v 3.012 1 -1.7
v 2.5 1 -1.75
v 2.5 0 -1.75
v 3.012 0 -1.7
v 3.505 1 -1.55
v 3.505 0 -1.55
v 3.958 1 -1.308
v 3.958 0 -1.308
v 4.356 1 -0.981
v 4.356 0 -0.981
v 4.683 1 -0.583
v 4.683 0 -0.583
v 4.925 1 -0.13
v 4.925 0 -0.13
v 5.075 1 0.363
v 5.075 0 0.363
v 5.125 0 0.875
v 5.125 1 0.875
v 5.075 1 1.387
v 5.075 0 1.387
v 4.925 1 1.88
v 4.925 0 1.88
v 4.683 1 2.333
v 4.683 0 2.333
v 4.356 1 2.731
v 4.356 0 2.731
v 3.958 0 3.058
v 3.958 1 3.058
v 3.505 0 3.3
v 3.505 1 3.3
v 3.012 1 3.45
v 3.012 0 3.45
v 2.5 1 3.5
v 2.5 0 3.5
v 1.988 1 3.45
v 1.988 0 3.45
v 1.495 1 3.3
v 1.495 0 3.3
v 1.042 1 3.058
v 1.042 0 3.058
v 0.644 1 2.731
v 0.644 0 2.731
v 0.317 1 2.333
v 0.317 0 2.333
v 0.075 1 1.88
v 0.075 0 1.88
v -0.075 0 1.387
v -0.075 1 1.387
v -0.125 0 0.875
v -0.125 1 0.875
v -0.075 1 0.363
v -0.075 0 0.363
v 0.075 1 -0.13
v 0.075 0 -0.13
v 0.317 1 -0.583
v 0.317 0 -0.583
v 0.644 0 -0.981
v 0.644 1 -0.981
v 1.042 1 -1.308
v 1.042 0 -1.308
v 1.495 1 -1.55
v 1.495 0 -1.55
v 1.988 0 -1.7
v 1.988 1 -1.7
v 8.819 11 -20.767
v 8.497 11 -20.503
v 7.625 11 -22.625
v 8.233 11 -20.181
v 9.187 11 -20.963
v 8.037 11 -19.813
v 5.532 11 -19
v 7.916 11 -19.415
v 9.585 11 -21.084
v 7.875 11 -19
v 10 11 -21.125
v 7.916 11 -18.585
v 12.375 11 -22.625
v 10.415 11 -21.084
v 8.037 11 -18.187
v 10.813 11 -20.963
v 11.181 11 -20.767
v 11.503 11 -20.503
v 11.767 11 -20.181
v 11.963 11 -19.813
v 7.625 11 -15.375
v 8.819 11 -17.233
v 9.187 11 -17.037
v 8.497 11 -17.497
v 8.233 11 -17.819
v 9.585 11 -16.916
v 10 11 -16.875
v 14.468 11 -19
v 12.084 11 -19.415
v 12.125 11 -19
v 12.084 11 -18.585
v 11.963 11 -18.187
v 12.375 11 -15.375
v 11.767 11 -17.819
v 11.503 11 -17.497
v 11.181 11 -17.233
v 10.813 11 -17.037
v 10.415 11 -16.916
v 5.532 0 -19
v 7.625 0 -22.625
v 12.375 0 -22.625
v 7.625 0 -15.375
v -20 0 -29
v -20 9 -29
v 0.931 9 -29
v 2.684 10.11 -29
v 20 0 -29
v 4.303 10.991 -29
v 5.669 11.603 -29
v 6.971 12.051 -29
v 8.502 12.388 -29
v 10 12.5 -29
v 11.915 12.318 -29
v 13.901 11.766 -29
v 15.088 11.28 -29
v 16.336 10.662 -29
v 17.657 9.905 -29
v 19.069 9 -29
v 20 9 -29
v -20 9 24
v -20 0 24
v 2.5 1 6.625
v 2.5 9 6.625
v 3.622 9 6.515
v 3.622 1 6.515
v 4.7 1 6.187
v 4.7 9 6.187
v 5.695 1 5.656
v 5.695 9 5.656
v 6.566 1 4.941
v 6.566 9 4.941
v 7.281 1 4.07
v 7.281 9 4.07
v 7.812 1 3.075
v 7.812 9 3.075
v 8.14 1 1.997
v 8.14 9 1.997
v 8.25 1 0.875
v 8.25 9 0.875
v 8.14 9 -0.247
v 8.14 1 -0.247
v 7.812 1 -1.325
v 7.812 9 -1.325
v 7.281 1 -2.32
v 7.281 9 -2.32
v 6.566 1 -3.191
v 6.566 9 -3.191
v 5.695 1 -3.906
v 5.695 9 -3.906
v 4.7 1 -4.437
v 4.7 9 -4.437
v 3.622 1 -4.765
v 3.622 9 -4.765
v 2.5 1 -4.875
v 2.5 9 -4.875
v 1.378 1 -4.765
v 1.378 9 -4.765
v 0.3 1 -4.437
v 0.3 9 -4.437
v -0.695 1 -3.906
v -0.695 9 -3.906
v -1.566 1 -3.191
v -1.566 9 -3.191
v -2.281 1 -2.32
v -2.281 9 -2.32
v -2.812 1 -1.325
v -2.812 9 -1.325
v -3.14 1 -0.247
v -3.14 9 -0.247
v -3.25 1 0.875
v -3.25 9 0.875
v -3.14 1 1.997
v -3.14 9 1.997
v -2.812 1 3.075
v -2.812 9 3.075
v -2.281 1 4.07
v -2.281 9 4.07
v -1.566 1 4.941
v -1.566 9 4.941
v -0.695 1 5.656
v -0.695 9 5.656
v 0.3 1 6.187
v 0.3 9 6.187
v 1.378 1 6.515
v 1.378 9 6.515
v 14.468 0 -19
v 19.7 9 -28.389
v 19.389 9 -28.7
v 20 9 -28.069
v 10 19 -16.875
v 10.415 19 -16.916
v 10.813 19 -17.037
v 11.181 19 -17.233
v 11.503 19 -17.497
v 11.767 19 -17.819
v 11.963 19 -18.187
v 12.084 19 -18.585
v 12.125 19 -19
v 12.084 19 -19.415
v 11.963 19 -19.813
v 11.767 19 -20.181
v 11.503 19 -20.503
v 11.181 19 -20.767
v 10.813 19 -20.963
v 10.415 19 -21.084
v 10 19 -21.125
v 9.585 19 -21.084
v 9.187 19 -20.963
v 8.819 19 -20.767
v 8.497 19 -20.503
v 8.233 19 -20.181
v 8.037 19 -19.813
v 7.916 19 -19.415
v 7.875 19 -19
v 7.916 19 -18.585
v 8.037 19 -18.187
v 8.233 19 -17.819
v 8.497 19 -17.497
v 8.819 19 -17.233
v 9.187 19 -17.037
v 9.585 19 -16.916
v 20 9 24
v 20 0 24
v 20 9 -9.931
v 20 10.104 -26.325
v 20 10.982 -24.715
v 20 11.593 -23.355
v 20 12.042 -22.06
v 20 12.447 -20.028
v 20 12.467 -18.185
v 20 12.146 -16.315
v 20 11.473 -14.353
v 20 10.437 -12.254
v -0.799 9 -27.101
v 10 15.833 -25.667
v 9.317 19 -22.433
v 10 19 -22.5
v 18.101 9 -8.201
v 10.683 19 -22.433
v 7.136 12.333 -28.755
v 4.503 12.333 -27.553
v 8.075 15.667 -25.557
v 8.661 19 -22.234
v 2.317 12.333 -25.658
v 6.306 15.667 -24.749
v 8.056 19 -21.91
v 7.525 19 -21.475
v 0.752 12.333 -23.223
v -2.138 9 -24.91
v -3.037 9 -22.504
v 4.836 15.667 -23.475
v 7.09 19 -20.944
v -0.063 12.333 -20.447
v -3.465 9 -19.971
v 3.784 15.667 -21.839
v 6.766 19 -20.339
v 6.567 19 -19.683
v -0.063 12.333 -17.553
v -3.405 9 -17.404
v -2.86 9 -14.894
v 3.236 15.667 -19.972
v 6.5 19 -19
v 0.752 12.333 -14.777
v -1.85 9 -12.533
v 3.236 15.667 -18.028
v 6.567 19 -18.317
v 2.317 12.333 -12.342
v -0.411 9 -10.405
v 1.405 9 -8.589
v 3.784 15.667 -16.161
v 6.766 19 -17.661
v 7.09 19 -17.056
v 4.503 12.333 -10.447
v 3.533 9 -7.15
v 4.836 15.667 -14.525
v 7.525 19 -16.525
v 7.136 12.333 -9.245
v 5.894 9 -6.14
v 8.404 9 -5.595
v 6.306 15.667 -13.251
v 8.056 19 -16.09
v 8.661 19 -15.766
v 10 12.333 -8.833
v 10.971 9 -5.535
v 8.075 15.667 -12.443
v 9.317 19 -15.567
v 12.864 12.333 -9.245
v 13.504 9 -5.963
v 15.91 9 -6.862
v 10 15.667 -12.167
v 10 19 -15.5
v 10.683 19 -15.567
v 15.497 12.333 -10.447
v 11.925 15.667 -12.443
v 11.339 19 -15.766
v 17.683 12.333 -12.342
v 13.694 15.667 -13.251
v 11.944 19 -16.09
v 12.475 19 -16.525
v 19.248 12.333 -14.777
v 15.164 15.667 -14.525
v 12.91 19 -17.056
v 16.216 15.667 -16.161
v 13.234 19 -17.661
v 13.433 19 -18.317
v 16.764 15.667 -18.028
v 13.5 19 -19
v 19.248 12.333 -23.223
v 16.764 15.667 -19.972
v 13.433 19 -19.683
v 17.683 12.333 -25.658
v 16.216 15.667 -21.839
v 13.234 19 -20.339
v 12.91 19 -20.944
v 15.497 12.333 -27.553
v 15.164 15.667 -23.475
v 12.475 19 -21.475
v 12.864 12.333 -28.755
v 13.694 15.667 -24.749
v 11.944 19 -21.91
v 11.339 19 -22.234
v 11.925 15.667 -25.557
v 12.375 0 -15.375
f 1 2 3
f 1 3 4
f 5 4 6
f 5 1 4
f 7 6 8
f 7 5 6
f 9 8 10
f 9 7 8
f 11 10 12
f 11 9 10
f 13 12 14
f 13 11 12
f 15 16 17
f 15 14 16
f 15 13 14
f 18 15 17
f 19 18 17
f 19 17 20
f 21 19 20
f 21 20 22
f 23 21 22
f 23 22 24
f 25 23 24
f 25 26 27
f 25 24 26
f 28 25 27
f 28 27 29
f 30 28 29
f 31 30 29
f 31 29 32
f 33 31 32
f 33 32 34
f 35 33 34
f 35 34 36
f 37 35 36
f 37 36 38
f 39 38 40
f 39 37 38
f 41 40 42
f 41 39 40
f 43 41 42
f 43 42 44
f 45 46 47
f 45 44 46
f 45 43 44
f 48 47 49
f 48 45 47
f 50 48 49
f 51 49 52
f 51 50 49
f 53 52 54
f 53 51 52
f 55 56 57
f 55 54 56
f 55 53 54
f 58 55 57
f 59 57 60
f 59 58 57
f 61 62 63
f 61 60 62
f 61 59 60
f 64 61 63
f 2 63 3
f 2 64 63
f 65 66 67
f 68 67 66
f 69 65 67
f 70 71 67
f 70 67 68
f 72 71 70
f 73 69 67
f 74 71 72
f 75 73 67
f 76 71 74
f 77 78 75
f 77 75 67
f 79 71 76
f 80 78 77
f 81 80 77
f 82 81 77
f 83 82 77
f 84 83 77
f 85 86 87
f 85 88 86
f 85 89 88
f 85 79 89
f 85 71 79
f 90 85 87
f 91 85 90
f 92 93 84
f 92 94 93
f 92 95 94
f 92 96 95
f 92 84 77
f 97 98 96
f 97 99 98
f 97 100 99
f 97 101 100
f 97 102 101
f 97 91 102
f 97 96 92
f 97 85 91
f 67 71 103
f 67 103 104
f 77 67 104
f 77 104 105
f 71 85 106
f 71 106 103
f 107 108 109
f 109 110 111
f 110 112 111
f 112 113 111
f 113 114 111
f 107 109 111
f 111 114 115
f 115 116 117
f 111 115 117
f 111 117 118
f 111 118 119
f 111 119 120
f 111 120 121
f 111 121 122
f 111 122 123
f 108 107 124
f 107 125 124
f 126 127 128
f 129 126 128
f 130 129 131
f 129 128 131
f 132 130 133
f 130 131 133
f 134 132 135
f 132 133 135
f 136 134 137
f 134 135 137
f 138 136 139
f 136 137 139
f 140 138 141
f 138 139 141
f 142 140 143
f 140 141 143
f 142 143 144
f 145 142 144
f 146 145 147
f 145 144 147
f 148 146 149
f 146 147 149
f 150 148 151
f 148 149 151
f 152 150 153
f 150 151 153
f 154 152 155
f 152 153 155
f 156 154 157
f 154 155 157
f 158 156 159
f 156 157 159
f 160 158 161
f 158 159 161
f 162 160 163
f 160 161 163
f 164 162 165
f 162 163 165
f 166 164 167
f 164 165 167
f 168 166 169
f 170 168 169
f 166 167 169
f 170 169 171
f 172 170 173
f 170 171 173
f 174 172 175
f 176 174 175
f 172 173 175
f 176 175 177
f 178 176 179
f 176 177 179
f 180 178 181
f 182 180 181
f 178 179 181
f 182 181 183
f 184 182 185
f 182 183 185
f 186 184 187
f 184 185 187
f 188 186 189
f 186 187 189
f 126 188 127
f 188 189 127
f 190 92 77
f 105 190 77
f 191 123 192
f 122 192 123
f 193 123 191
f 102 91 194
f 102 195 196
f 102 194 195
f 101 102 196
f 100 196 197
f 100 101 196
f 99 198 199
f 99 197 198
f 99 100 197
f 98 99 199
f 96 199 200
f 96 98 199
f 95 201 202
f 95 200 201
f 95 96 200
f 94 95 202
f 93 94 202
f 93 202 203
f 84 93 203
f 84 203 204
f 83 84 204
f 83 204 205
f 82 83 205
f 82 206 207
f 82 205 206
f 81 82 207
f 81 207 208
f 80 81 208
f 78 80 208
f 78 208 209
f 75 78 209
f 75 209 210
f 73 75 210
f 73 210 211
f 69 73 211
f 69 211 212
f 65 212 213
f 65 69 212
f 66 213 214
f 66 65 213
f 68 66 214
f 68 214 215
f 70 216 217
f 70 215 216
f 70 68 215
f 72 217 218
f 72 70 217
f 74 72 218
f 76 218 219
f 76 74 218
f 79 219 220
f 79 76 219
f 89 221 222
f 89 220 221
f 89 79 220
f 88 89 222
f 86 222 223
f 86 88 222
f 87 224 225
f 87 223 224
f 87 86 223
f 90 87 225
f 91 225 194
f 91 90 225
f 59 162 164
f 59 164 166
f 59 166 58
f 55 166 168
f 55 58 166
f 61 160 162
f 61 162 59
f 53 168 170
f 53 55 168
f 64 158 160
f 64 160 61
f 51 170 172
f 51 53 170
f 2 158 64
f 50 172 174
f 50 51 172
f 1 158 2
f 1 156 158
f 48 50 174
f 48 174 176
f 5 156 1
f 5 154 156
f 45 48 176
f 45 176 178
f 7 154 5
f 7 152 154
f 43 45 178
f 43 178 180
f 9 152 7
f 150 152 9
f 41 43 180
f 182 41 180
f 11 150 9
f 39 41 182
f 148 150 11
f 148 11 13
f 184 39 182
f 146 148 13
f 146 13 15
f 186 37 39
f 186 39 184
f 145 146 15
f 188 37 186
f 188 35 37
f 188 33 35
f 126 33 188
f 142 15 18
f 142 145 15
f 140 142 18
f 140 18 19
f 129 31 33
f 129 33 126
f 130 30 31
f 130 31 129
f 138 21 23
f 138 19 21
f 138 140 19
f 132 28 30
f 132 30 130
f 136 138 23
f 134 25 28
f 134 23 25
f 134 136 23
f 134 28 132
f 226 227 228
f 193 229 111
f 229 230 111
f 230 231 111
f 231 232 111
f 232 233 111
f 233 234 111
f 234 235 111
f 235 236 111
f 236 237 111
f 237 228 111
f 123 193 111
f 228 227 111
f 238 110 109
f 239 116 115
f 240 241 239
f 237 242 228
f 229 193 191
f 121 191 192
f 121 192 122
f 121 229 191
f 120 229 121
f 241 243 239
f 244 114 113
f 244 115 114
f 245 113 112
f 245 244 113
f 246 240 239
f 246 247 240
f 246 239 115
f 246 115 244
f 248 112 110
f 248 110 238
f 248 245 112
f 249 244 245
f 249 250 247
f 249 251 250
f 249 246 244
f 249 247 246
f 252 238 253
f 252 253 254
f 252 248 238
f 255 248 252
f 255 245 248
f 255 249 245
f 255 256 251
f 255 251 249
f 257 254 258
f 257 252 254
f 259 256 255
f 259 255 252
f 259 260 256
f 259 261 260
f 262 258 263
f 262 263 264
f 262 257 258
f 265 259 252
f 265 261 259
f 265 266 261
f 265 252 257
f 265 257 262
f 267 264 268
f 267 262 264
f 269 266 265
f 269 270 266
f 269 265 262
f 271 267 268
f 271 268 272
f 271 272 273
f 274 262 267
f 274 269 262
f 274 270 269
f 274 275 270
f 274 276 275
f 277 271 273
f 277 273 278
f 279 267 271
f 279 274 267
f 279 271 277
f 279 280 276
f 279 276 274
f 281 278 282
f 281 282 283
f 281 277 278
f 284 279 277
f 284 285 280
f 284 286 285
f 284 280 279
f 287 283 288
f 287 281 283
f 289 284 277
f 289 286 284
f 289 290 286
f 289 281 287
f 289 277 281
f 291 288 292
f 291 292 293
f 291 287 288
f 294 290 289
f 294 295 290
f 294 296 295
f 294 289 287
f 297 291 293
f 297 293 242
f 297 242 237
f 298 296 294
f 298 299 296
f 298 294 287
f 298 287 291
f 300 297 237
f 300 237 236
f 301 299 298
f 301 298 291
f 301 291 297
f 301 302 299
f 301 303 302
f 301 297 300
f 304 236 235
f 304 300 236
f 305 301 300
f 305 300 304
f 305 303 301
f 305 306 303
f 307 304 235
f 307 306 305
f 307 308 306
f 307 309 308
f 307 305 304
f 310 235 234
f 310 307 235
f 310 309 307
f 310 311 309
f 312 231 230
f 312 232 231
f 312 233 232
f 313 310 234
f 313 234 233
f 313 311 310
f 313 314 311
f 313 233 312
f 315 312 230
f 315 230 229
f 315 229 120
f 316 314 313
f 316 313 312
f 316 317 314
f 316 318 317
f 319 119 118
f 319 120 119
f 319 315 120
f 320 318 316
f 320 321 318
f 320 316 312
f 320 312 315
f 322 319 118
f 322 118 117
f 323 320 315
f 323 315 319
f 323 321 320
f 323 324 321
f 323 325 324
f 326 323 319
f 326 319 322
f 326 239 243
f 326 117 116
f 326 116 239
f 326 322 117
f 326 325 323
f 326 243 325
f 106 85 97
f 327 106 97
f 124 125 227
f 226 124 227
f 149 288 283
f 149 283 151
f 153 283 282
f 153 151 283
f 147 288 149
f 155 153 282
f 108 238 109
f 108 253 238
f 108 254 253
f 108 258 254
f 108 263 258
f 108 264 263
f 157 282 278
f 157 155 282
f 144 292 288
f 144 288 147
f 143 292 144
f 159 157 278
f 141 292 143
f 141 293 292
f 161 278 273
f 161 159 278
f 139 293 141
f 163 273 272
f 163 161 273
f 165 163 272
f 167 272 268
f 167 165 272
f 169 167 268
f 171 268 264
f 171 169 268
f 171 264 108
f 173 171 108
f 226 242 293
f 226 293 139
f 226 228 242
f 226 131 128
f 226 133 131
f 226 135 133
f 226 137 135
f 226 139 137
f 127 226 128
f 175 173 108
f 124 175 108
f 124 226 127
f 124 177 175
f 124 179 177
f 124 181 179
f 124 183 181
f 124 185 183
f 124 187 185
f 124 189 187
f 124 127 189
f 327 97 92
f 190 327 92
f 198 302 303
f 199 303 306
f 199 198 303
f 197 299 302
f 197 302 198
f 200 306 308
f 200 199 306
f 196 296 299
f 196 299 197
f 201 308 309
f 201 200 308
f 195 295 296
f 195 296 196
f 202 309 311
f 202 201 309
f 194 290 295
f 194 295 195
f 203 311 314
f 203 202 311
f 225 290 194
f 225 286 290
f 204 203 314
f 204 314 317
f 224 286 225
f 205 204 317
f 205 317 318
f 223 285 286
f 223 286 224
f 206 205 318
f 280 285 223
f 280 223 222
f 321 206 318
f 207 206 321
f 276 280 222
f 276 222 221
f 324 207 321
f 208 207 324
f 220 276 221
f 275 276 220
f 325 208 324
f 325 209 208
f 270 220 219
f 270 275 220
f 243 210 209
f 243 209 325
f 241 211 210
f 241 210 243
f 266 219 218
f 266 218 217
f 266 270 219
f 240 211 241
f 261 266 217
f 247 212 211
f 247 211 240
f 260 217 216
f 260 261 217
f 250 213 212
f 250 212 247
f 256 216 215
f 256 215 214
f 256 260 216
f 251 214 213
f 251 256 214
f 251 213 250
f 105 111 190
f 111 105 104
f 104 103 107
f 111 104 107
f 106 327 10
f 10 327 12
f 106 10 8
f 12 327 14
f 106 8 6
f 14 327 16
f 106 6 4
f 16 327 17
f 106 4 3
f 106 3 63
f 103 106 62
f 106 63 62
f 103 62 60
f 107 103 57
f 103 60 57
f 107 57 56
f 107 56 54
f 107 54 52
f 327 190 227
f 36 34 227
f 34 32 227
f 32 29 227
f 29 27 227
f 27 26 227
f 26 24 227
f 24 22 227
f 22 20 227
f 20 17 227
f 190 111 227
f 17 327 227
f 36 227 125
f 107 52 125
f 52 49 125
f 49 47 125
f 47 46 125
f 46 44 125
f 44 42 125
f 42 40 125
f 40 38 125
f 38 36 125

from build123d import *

# Parameters (mm, degrees)
SKETCH1_W               = 40
SKETCH1_H               = 48
BOSS_EXTRUDE1_DEPTH     = 9
CUT_EXTRUDE1_DEPTH      = 33.511536414
CUT_EXTRUDE1_DEPTH_BACK = 33.511536414
SKETCH2_R               = 2.625
SKETCH3_R               = 5.75
CUT_EXTRUDE2_DEPTH      = 8
SKETCH5_R               = 3.5
BOSS_EXTRUDE2_DEPTH     = 10
SKETCH6_W               = 40
SKETCH6_H               = 9
BOSS_EXTRUDE3_DEPTH     = 5
CHAMFER1_SIZE           = 10
CUT_EXTRUDE3_DEPTH      = 41.024992192
CUT_EXTRUDE3_DEPTH_BACK = 41.024992192
SKETCH7_R               = 2.125
CUT_EXTRUDE4_START      = -11
SKETCH8_W               = 4.75
SKETCH8_H               = 7.25
SKETCH8_R               = 2.125
CUT_EXTRUDE4_DEPTH      = 11


with BuildPart() as part:
    # Sketch1 → Boss-Extrude1 (new body)
    with BuildSketch(Plane(origin=(0, 0, 0), x_dir=(1, 0, 0), z_dir=(0, 1, 0))):
        Rectangle(SKETCH1_W, SKETCH1_H)
    extrude(amount=BOSS_EXTRUDE1_DEPTH)

    # Sketch2 → Cut-Extrude1 (cut, two sides: drawn at the far end of the back side and taken through both)
    with BuildSketch(Plane.XZ.offset(-CUT_EXTRUDE1_DEPTH_BACK)):
        with Locations(Location((2.5, 0.875, 0), (0, 0, 270))):
            Circle(SKETCH2_R)
    extrude(amount=CUT_EXTRUDE1_DEPTH + CUT_EXTRUDE1_DEPTH_BACK, mode=Mode.SUBTRACT)

    # Sketch3 → Cut-Extrude2 (cut)
    with BuildSketch(Plane(origin=(0, 9, 0), x_dir=(1, 0, 0), z_dir=(0, 1, 0))):
        with Locations(Location((2.5, -0.875, 0), (0, 0, 270))):
            Circle(SKETCH3_R)
    extrude(amount=-CUT_EXTRUDE2_DEPTH, mode=Mode.SUBTRACT)

    # Sketch5 → Boss-Extrude2 (add)
    with BuildSketch(Plane(origin=(0, 9, 0), x_dir=(1, 0, 0), z_dir=(0, 1, 0))):
        with Locations(Location((10, 19, 0), (0, 0, 90))):
            Circle(SKETCH5_R)
    extrude(amount=BOSS_EXTRUDE2_DEPTH)

    # Sketch6 → Boss-Extrude3 (add)
    with BuildSketch(Plane(origin=(0, 0, -24), x_dir=(-1, 0, 0), z_dir=(0, 0, -1))):
        with Locations((0, 4.5)):
            Rectangle(SKETCH6_W, SKETCH6_H)
    extrude(amount=BOSS_EXTRUDE3_DEPTH)

    # Chamfer1
    # the kernel refuses this chamfer: 10 mm, written as the material it adds along each edge
    with BuildSketch(Plane(origin=(10, 9, -19), x_dir=(0, 0, -1), z_dir=(1, 0, 0))) as chamfer1_piece_1_section:
        Polygon((3.5 + CHAMFER1_SIZE, 0), (3.5, CHAMFER1_SIZE), (3.5, 0), align=None)
    chamfer1_piece_1 = revolve(axis=Axis((10, 9, -19), (0, 1, 0)), mode=Mode.PRIVATE)
    chamfer1_piece_1 = split(chamfer1_piece_1, bisect_by=Plane(origin=(20, 13.766694853, -10.450462434), z_dir=(-1, 0, 0)), keep=Keep.TOP, mode=Mode.PRIVATE)
    chamfer1_piece_1 = split(chamfer1_piece_1, bisect_by=Plane(origin=(10, 13.766694853, -29), z_dir=(0, 0, 1)), keep=Keep.TOP, mode=Mode.PRIVATE)
    chamfer1_piece_1 = split(chamfer1_piece_1, bisect_by=Plane(origin=(10, 19, -10.450462434), z_dir=(0, -1, 0)), keep=Keep.TOP, mode=Mode.PRIVATE)
    add(chamfer1_piece_1)

    # Sketch7 → Cut-Extrude3 (cut, two sides: drawn at the far end of the back side and taken through both)
    with BuildSketch(Plane(origin=(0, 19, 0), x_dir=(1, 0, 0), z_dir=(0, 1, 0)).offset(-CUT_EXTRUDE3_DEPTH_BACK)):
        with Locations(Location((10, 19, 0), (0, 0, 270))):
            Circle(SKETCH7_R)
    extrude(amount=CUT_EXTRUDE3_DEPTH + CUT_EXTRUDE3_DEPTH_BACK, mode=Mode.SUBTRACT)

    # Sketch8 → Cut-Extrude4 (cut)
    # profile 1 of 3: a face of its own
    with BuildSketch(Plane.XZ.offset(CUT_EXTRUDE4_START)):
        with Locations((10, -19)):
            Rectangle(SKETCH8_W, SKETCH8_H)
        with Locations(Location((10, -19, 0), (0, 0, 90))):
            Circle(SKETCH8_R, mode=Mode.SUBTRACT)
    # profile 2 of 3: a face of its own
    with BuildSketch(Plane.XZ.offset(CUT_EXTRUDE4_START)):
        Polygon((7.625, -22.625), (7.625, -15.375), (5.532105274, -19), align=None)
    # profile 3 of 3: a face of its own
    with BuildSketch(Plane.XZ.offset(CUT_EXTRUDE4_START)):
        Polygon((14.467894726, -19), (12.375, -22.625), (12.375, -15.375), align=None)
    extrude(amount=CUT_EXTRUDE4_DEPTH, mode=Mode.SUBTRACT)


solid = part.part
